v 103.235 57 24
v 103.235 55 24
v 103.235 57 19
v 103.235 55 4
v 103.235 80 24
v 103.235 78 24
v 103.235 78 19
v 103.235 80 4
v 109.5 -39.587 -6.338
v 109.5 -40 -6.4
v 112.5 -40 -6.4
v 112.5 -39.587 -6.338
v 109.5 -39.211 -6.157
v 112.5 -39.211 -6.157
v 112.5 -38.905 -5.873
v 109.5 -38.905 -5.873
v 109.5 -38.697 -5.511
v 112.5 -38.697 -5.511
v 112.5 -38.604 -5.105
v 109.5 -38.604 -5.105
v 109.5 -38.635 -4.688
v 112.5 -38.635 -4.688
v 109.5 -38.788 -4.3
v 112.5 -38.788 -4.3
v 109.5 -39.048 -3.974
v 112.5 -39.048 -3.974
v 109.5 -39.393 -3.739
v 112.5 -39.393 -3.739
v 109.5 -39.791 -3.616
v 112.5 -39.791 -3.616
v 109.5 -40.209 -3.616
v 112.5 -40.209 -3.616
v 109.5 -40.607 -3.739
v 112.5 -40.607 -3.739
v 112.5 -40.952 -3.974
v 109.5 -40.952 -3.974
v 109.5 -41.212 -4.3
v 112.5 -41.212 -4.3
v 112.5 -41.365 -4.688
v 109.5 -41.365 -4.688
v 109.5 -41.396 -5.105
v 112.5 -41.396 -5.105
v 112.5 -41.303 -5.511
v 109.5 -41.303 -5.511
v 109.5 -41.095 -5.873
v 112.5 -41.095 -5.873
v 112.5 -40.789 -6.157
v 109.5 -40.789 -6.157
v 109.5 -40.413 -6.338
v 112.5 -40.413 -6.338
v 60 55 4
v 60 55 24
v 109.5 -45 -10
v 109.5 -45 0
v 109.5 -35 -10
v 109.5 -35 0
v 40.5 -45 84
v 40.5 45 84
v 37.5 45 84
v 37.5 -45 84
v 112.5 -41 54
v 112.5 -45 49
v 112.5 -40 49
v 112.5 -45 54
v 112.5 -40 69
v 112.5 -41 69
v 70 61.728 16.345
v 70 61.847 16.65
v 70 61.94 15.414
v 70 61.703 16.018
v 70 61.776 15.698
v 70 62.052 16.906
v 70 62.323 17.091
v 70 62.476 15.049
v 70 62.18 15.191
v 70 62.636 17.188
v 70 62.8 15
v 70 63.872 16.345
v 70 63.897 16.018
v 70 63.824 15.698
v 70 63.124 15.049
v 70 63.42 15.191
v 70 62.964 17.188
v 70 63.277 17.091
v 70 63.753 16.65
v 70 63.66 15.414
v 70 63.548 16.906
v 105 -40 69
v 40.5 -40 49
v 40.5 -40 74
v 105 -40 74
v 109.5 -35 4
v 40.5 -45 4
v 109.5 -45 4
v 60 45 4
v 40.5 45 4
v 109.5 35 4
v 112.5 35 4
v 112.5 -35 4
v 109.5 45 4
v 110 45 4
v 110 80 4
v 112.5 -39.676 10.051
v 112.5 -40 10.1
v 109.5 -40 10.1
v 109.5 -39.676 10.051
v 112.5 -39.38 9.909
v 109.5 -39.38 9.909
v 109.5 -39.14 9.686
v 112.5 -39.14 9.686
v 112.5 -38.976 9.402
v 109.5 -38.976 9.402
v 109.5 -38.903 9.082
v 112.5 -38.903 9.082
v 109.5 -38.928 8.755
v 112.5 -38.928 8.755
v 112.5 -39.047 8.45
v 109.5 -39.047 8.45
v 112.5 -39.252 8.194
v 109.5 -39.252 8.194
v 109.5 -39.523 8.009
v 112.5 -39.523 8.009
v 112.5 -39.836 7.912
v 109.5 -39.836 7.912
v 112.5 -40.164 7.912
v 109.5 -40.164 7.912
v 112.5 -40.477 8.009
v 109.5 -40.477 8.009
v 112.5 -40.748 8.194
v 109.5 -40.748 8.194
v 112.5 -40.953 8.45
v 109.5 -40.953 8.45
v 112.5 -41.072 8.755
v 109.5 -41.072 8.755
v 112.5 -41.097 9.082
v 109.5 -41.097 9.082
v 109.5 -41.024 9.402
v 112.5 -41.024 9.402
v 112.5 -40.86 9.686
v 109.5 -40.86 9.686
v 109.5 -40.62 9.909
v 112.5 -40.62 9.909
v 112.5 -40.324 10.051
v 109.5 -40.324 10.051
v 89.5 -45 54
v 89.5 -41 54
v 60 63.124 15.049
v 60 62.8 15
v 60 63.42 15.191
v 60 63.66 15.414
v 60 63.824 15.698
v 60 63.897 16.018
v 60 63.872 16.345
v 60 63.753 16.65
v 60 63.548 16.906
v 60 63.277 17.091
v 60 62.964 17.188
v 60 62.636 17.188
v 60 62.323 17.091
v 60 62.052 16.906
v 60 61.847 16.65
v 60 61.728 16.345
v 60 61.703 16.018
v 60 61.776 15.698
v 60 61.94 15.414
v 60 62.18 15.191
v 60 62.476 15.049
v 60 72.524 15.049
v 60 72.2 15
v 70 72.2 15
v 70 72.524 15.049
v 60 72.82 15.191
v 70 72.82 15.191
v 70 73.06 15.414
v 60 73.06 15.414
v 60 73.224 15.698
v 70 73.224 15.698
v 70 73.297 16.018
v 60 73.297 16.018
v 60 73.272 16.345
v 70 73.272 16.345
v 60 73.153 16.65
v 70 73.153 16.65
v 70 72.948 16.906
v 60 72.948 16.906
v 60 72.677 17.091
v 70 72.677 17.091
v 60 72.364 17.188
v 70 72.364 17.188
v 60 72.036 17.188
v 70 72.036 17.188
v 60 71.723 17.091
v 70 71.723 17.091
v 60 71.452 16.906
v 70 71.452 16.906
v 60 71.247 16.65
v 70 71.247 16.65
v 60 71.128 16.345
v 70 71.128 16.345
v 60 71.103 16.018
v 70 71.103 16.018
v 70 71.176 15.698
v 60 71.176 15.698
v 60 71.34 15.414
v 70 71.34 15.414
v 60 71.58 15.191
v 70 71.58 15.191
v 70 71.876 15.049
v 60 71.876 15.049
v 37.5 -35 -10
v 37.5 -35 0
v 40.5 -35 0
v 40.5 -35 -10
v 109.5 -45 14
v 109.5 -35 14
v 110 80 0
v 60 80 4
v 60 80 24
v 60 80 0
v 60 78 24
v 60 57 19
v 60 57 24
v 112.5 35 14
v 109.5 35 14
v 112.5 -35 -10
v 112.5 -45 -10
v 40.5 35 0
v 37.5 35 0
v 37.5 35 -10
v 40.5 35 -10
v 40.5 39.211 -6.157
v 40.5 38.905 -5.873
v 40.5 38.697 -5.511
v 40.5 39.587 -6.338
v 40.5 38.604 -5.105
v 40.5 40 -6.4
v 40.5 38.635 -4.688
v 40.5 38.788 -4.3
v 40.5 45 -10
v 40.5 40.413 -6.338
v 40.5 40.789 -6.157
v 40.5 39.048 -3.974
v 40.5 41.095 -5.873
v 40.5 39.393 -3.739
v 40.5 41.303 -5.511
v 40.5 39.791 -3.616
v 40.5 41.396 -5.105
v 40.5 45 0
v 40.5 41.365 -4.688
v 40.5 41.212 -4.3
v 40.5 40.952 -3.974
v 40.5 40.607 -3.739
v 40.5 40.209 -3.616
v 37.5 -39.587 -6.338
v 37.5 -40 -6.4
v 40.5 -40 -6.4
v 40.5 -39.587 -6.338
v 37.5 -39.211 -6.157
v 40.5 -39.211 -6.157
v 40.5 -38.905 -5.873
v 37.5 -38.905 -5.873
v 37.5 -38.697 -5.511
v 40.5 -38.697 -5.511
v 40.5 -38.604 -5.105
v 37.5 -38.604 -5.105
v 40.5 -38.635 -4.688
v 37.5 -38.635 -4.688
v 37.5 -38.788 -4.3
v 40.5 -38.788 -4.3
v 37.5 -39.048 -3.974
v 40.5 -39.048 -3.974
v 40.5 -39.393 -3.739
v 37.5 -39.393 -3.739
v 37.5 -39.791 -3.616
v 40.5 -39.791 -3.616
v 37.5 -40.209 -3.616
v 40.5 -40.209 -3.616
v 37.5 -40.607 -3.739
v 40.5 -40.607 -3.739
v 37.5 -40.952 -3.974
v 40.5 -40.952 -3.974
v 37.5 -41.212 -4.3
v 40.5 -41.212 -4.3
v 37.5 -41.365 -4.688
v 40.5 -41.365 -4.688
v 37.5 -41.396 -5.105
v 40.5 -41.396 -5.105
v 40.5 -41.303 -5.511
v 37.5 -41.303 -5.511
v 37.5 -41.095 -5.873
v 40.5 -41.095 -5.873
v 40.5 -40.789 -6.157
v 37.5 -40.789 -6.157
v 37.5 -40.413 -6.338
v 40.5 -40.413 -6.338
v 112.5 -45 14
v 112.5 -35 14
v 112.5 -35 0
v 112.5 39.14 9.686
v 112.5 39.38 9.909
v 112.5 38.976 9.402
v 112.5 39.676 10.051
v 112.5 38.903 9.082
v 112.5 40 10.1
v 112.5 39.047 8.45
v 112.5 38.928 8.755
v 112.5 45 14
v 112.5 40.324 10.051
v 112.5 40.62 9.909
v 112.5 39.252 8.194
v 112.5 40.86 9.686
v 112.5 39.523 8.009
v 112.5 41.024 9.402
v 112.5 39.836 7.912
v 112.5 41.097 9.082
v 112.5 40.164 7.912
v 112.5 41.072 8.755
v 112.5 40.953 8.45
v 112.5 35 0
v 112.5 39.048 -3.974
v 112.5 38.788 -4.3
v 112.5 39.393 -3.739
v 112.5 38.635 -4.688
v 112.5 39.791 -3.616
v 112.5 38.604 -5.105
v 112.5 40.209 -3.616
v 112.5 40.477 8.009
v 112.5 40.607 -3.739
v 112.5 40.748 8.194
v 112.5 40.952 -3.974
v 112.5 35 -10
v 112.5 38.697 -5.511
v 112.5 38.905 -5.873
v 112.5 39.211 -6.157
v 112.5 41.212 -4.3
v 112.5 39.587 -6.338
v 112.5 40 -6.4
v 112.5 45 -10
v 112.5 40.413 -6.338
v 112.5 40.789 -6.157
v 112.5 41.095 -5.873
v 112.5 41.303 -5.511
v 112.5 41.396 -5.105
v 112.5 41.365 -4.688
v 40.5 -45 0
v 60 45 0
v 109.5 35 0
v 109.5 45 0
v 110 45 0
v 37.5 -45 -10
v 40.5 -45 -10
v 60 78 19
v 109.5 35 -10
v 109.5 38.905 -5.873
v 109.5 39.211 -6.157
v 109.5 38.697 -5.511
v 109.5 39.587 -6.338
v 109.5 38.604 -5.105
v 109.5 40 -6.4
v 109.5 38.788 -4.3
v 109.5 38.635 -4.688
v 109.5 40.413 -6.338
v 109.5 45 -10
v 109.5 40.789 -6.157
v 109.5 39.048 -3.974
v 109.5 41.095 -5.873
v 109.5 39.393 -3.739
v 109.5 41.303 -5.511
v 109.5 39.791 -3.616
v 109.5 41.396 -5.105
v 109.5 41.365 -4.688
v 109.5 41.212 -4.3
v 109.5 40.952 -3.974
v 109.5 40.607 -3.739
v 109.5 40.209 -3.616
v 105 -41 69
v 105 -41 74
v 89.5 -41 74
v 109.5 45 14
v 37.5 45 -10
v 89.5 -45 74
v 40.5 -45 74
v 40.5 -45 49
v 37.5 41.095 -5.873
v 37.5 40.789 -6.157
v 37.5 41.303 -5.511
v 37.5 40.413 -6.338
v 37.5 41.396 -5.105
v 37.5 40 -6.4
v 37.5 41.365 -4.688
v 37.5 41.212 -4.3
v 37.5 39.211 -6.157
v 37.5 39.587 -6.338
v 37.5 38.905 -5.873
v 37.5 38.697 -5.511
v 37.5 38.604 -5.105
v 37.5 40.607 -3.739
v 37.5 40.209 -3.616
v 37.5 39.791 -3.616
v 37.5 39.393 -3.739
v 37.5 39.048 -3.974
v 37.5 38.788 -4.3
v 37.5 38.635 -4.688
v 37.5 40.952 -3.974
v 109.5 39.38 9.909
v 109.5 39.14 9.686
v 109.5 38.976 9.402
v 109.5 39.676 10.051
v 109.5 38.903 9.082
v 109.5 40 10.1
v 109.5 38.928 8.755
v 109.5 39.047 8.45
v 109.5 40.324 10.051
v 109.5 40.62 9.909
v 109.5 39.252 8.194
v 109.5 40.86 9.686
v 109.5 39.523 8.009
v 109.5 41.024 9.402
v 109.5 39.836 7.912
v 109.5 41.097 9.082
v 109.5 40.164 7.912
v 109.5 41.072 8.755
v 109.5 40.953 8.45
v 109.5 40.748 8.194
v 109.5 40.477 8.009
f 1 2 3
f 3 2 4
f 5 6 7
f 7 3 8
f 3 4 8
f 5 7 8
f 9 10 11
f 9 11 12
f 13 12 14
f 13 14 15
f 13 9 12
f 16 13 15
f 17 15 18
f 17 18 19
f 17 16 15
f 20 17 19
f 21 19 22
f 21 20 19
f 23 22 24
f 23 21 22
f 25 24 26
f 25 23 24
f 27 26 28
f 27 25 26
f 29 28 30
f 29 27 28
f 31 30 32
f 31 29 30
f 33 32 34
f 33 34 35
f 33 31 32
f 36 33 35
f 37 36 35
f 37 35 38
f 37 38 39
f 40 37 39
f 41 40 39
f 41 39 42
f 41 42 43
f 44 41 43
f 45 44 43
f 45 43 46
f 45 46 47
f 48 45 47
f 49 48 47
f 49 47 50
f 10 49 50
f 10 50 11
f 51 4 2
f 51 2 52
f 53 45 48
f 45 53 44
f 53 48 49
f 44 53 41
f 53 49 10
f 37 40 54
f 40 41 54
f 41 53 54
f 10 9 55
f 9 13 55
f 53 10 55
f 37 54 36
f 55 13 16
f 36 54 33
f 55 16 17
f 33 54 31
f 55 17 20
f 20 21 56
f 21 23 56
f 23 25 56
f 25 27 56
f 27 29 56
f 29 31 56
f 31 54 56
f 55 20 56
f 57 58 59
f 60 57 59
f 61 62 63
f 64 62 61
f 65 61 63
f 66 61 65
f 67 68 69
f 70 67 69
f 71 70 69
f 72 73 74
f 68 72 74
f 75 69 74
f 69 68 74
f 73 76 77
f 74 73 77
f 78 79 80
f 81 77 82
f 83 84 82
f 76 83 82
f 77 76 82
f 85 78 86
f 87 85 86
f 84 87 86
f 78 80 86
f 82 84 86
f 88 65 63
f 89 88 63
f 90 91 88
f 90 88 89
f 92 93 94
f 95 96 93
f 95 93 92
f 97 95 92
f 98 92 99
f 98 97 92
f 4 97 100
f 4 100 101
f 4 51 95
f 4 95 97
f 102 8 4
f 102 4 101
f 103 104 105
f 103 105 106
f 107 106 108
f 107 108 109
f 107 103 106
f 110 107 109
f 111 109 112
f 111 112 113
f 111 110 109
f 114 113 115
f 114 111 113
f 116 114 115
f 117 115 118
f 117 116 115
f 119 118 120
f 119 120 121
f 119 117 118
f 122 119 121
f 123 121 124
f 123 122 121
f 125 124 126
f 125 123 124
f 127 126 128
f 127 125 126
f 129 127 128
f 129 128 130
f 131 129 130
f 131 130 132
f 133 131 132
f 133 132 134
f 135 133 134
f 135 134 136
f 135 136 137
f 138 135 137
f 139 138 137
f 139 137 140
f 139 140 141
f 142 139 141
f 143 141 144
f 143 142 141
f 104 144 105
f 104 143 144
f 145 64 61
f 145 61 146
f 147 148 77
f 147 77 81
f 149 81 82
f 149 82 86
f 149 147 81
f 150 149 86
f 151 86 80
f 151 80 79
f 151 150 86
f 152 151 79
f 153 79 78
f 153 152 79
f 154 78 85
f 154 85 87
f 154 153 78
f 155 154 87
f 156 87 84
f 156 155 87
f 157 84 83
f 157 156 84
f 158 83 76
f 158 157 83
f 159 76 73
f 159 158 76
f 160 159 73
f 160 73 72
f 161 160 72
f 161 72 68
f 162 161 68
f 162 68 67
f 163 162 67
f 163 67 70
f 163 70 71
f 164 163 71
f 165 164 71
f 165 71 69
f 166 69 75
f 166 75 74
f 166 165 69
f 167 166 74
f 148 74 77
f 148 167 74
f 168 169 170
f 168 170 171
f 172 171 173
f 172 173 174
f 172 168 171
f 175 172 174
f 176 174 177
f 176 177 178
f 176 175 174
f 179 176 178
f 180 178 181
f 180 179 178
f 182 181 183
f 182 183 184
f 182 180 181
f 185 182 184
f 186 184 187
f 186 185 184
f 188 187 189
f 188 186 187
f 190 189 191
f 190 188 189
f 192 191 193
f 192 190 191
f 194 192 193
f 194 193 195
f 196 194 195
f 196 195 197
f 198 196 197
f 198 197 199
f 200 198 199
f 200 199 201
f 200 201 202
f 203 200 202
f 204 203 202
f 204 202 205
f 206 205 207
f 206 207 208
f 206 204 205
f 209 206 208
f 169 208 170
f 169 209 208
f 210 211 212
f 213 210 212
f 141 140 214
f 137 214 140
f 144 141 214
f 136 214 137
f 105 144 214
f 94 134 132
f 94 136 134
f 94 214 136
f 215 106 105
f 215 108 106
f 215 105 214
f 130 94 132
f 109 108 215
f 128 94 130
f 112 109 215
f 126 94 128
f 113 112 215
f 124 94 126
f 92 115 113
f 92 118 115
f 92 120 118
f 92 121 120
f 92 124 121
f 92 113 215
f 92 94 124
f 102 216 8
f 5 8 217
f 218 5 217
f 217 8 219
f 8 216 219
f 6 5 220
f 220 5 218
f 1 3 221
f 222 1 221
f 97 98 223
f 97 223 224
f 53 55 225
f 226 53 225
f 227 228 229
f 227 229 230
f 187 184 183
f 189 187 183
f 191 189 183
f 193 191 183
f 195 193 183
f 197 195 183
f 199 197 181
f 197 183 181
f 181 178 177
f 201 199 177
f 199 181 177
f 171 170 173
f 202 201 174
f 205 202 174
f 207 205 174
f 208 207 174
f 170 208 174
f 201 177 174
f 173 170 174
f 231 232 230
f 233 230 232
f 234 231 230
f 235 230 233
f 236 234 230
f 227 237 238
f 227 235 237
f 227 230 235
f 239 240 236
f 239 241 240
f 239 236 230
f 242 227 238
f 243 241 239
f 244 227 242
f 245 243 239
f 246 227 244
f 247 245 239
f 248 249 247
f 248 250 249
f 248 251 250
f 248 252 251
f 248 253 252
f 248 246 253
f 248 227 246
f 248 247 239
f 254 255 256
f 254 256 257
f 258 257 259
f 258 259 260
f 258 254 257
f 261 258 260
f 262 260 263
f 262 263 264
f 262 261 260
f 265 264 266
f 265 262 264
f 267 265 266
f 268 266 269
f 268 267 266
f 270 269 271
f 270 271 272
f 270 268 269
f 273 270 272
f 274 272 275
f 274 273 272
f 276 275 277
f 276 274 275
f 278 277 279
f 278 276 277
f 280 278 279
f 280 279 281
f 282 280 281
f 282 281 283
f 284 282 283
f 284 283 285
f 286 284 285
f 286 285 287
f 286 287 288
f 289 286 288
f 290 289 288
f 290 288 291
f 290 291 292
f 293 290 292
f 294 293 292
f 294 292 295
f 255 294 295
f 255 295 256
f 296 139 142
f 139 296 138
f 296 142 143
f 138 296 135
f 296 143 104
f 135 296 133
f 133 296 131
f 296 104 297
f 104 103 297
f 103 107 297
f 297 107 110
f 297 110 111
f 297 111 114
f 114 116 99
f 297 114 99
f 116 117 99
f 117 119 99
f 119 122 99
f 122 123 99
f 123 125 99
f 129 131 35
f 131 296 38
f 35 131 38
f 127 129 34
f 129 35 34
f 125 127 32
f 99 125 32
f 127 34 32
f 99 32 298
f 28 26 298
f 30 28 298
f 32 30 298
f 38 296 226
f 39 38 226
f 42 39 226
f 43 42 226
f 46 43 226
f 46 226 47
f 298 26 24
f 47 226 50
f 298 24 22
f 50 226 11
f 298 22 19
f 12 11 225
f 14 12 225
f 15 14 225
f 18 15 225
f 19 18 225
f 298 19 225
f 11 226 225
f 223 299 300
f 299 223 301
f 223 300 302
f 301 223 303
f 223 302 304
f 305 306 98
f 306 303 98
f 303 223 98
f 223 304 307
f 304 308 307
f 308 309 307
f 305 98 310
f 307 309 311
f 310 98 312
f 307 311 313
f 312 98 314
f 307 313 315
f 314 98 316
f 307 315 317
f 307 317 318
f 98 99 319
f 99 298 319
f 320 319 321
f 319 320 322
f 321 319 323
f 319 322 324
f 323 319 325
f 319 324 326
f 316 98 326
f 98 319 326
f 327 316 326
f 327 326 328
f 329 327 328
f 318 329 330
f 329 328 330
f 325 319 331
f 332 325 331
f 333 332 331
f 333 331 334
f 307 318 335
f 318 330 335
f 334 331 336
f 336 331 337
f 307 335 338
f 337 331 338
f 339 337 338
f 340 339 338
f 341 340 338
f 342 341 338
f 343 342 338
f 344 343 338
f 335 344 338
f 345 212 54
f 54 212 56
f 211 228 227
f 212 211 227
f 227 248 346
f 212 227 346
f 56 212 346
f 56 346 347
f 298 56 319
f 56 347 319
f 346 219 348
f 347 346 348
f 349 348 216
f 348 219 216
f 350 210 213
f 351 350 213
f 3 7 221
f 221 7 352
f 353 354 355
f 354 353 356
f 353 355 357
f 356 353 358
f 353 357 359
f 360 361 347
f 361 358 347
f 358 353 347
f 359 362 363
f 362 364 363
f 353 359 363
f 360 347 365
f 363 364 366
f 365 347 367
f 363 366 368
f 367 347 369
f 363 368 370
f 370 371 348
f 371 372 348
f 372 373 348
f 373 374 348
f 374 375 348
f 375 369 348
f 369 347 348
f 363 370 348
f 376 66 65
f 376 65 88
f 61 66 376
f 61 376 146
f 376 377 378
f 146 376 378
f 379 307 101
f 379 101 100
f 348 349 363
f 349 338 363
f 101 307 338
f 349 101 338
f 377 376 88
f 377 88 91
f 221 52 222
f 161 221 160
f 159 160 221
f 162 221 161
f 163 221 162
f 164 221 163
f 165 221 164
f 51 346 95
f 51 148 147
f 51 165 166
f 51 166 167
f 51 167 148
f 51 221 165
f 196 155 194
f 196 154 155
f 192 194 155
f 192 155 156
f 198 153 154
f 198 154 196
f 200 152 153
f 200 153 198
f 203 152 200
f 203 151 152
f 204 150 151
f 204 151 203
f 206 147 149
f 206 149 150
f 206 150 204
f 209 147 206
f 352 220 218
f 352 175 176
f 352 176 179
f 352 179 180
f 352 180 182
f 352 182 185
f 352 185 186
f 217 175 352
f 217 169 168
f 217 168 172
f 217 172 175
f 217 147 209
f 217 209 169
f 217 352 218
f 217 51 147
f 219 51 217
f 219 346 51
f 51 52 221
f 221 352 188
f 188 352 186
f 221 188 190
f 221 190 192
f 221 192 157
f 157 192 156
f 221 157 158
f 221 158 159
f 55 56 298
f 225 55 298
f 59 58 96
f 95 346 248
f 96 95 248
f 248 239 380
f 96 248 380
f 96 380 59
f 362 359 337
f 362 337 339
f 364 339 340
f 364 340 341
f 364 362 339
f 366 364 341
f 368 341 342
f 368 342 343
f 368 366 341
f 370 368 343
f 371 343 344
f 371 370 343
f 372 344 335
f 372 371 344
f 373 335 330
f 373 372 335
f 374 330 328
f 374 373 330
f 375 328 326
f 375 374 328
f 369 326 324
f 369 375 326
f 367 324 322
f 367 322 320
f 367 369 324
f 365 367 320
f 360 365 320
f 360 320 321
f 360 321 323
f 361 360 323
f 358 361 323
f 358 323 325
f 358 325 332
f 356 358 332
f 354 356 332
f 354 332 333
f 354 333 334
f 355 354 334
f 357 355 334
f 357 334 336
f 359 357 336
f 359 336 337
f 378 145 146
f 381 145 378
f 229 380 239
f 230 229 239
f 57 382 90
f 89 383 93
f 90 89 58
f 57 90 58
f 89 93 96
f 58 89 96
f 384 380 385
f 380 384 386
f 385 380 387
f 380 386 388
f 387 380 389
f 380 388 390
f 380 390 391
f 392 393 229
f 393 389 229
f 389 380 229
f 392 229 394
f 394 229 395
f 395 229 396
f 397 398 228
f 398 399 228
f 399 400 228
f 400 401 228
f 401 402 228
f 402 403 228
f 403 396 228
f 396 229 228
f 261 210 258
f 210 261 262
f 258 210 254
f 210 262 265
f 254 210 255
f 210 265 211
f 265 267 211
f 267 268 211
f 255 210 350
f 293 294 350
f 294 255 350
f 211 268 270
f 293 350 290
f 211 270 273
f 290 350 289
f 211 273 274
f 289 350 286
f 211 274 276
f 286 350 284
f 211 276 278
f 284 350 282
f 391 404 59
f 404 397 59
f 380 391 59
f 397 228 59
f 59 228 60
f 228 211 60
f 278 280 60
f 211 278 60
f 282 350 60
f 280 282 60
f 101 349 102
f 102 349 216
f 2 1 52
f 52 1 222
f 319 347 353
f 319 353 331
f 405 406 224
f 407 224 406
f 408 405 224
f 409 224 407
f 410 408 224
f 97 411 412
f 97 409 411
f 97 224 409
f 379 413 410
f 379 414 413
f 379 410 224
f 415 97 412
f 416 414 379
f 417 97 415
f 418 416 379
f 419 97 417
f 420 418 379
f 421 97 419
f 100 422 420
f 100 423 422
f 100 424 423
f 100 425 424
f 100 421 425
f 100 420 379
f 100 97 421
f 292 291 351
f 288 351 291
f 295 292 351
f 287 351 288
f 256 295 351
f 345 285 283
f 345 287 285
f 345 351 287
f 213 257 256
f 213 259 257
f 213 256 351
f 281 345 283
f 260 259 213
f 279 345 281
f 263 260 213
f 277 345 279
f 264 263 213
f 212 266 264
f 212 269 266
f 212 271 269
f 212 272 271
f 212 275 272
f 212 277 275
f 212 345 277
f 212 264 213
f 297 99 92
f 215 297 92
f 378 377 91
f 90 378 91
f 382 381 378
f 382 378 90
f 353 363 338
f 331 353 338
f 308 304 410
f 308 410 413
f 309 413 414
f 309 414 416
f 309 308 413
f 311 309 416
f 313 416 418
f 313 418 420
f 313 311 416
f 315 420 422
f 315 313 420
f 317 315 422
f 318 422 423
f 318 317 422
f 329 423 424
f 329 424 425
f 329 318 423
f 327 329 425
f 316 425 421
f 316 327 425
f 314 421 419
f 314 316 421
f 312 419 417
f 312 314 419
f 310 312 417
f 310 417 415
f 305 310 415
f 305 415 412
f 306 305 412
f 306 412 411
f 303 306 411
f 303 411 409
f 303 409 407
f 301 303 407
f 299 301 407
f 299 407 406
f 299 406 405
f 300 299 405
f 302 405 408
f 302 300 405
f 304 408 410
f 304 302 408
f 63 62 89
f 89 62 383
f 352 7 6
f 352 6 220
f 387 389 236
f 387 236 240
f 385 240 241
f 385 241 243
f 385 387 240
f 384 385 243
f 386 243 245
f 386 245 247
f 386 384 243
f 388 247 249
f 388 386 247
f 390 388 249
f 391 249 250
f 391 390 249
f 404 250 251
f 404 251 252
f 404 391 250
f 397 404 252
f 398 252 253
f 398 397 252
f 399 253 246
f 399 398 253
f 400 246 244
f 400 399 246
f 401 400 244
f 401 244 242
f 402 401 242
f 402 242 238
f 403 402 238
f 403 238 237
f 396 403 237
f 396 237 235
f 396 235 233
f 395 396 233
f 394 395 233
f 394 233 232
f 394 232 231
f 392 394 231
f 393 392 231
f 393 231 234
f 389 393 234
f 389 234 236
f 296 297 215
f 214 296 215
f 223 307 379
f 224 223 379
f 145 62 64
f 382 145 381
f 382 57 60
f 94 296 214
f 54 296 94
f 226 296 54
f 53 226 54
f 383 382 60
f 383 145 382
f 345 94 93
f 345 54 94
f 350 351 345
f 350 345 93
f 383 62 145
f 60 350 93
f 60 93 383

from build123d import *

# Parameters (mm, degrees)
EXTRUDE_1_DEPTH     = 4
SKETCH_3_W          = 43.235473071
SKETCH_3_H          = 2
EXTRUDE_2_DEPTH     = 20
SKETCH_4_W          = 43.235473071
SKETCH_4_H          = 21
EXTRUDE_3_DEPTH     = 15
SKETCH_8_W          = 3
SKETCH_8_H          = 10
EXTRUDE_4_DEPTH     = 10
SKETCH_10_R         = 1.4
CUT_EXTRUDE_1_DEPTH = 83
SKETCH_11_W         = 3
SKETCH_11_H         = 90
EXTRUDE_5_DEPTH     = 80
SKETCH_12_W         = 75
SKETCH_12_H         = 25
EXTRUDE_6_DEPTH     = 5
SKETCH_13_W         = 23
SKETCH_13_H         = 20
CUT_EXTRUDE_2_DEPTH = 4
CUT_EXTRUDE_3_REACH = 123
SKETCH_14_W         = 7.5
SKETCH_14_H         = 5
SKETCH_15_R         = 1.1
CUT_EXTRUDE_4_DEPTH = 10
SKETCH_17_W         = 3
SKETCH_17_H         = 10
EXTRUDE_7_DEPTH     = 10
SKETCH_18_R         = 1.1
CUT_EXTRUDE_5_DEPTH = 3
SKETCH_19_W         = 3
SKETCH_19_H         = 10
EXTRUDE_8_DEPTH     = 10
SKETCH_20_R         = 1.1
CUT_EXTRUDE_6_DEPTH = 3


with BuildPart() as part:
    # 草圖1 → 填料-伸長1 (new body)
    with BuildSketch(Plane.XY):
        Polygon((-37.5, 45), (-35, 45), (-35, 80), (15, 80), (15, 45), (37.5, 45), (37.5, -45), (-37.5, -45), align=None)
    extrude(amount=EXTRUDE_1_DEPTH)

    # 草圖3 → 填料-伸長2 (add)
    with BuildSketch(Plane.XY.offset(4)):
        with Locations((-6.617736535, 56)):
            Rectangle(SKETCH_3_W, SKETCH_3_H)
        with Locations((-6.617736535, 79)):
            Rectangle(SKETCH_3_W, SKETCH_3_H)
    extrude(amount=EXTRUDE_2_DEPTH)

    # 草圖4 → 填料-伸長3 (add)
    with BuildSketch(Plane.XY.offset(4)):
        with Locations((-6.617736535, 67.5)):
            Rectangle(SKETCH_4_W, SKETCH_4_H)
    extrude(amount=EXTRUDE_3_DEPTH)

    # 草圖8 → 填料-伸長4 (add)
    with BuildSketch(Plane(origin=(0, 0, 0), x_dir=(-1, 0, 0), z_dir=(0, 0, -1))):
        with Locations((-36, 40)):
            Rectangle(SKETCH_8_W, SKETCH_8_H)
        with Locations((36, 40)):
            Rectangle(SKETCH_8_W, SKETCH_8_H)
        with Locations((36, -40)):
            Rectangle(SKETCH_8_W, SKETCH_8_H)
        with Locations((-36, -40)):
            Rectangle(SKETCH_8_W, SKETCH_8_H)
    extrude(amount=EXTRUDE_4_DEPTH)

    # 草圖10 → 除料-伸長1 (cut)
    with BuildSketch(Plane(origin=(37.5, 0, 0), x_dir=(0, 0, -1), z_dir=(1, 0, 0))):
        with Locations((5, 40)):
            Circle(SKETCH_10_R)
        with Locations((5, -40)):
            Circle(SKETCH_10_R)
    extrude(amount=-CUT_EXTRUDE_1_DEPTH, mode=Mode.SUBTRACT)

    # 草圖11 → 填料-伸長5 (add)
    with BuildSketch(Plane.XY.offset(4)):
        with Locations((36, 0)):
            Rectangle(SKETCH_11_W, SKETCH_11_H)
    extrude(amount=EXTRUDE_5_DEPTH)

    # 草圖12 → 填料-伸長6 (add)
    with BuildSketch(Plane.XZ.offset(45)):
        with Locations((0, 61.5)):
            Rectangle(SKETCH_12_W, SKETCH_12_H)
    extrude(amount=-EXTRUDE_6_DEPTH)

    # 草圖13 → 除料-伸長2 (cut)
    with BuildSketch(Plane.XZ.offset(45)):
        with Locations((-26, 64)):
            Rectangle(SKETCH_13_W, SKETCH_13_H)
    extrude(amount=-CUT_EXTRUDE_2_DEPTH, mode=Mode.SUBTRACT)

    # 草圖14 → 除料-伸長3 (cut, up to next)
    with BuildSketch(Plane.XZ.offset(41), mode=Mode.PRIVATE) as cut_extrude_3_sk1:
        with Locations((-33.75, 71.5)):
            Rectangle(SKETCH_14_W, SKETCH_14_H)
    cut_extrude_3_tool1 = extrude(cut_extrude_3_sk1.sketch, amount=-CUT_EXTRUDE_3_REACH, mode=Mode.PRIVATE) & part.part
    add(cut_extrude_3_tool1.solids().sort_by_distance((-33.75, -41, 71.5))[0], mode=Mode.SUBTRACT)

    # 草圖15 → 除料-伸長4 (cut)
    with BuildSketch(Plane(origin=(15, 0, 0), x_dir=(0, 0, -1), z_dir=(1, 0, 0))):
        with Locations((-16.1, 72.2)):
            Circle(SKETCH_15_R)
        with Locations((-16.1, 62.8)):
            Circle(SKETCH_15_R)
    extrude(amount=-CUT_EXTRUDE_4_DEPTH, mode=Mode.SUBTRACT)

    # 草圖17 → 填料-伸長7 (add)
    with BuildSketch(Plane.XY.offset(4)):
        with Locations((-36, 40)):
            Rectangle(SKETCH_17_W, SKETCH_17_H)
    extrude(amount=EXTRUDE_7_DEPTH)

    # 草圖18 → 除料-伸長5 (cut)
    with BuildSketch(Plane.ZY.offset(37.5)):
        with Locations((9, 40)):
            Circle(SKETCH_18_R)
    extrude(amount=-CUT_EXTRUDE_5_DEPTH, mode=Mode.SUBTRACT)

    # 草圖19 → 填料-伸長8 (add)
    with BuildSketch(Plane.XY.offset(4)):
        with Locations((-36, -40)):
            Rectangle(SKETCH_19_W, SKETCH_19_H)
    extrude(amount=EXTRUDE_8_DEPTH)

    # 草圖20 → 除料-伸長6 (cut)
    with BuildSketch(Plane.ZY.offset(37.5)):
        with Locations((9, -40)):
            Circle(SKETCH_20_R)
    extrude(amount=-CUT_EXTRUDE_6_DEPTH, mode=Mode.SUBTRACT)


with BuildPart() as body_2:
    # 鏡射1: mirrored copy
    add(part.part.mirror(Plane(origin=(37.5, 0, 4), x_dir=(0, 0, 1), z_dir=(1, 0, 0))))


solid = body_2.part
